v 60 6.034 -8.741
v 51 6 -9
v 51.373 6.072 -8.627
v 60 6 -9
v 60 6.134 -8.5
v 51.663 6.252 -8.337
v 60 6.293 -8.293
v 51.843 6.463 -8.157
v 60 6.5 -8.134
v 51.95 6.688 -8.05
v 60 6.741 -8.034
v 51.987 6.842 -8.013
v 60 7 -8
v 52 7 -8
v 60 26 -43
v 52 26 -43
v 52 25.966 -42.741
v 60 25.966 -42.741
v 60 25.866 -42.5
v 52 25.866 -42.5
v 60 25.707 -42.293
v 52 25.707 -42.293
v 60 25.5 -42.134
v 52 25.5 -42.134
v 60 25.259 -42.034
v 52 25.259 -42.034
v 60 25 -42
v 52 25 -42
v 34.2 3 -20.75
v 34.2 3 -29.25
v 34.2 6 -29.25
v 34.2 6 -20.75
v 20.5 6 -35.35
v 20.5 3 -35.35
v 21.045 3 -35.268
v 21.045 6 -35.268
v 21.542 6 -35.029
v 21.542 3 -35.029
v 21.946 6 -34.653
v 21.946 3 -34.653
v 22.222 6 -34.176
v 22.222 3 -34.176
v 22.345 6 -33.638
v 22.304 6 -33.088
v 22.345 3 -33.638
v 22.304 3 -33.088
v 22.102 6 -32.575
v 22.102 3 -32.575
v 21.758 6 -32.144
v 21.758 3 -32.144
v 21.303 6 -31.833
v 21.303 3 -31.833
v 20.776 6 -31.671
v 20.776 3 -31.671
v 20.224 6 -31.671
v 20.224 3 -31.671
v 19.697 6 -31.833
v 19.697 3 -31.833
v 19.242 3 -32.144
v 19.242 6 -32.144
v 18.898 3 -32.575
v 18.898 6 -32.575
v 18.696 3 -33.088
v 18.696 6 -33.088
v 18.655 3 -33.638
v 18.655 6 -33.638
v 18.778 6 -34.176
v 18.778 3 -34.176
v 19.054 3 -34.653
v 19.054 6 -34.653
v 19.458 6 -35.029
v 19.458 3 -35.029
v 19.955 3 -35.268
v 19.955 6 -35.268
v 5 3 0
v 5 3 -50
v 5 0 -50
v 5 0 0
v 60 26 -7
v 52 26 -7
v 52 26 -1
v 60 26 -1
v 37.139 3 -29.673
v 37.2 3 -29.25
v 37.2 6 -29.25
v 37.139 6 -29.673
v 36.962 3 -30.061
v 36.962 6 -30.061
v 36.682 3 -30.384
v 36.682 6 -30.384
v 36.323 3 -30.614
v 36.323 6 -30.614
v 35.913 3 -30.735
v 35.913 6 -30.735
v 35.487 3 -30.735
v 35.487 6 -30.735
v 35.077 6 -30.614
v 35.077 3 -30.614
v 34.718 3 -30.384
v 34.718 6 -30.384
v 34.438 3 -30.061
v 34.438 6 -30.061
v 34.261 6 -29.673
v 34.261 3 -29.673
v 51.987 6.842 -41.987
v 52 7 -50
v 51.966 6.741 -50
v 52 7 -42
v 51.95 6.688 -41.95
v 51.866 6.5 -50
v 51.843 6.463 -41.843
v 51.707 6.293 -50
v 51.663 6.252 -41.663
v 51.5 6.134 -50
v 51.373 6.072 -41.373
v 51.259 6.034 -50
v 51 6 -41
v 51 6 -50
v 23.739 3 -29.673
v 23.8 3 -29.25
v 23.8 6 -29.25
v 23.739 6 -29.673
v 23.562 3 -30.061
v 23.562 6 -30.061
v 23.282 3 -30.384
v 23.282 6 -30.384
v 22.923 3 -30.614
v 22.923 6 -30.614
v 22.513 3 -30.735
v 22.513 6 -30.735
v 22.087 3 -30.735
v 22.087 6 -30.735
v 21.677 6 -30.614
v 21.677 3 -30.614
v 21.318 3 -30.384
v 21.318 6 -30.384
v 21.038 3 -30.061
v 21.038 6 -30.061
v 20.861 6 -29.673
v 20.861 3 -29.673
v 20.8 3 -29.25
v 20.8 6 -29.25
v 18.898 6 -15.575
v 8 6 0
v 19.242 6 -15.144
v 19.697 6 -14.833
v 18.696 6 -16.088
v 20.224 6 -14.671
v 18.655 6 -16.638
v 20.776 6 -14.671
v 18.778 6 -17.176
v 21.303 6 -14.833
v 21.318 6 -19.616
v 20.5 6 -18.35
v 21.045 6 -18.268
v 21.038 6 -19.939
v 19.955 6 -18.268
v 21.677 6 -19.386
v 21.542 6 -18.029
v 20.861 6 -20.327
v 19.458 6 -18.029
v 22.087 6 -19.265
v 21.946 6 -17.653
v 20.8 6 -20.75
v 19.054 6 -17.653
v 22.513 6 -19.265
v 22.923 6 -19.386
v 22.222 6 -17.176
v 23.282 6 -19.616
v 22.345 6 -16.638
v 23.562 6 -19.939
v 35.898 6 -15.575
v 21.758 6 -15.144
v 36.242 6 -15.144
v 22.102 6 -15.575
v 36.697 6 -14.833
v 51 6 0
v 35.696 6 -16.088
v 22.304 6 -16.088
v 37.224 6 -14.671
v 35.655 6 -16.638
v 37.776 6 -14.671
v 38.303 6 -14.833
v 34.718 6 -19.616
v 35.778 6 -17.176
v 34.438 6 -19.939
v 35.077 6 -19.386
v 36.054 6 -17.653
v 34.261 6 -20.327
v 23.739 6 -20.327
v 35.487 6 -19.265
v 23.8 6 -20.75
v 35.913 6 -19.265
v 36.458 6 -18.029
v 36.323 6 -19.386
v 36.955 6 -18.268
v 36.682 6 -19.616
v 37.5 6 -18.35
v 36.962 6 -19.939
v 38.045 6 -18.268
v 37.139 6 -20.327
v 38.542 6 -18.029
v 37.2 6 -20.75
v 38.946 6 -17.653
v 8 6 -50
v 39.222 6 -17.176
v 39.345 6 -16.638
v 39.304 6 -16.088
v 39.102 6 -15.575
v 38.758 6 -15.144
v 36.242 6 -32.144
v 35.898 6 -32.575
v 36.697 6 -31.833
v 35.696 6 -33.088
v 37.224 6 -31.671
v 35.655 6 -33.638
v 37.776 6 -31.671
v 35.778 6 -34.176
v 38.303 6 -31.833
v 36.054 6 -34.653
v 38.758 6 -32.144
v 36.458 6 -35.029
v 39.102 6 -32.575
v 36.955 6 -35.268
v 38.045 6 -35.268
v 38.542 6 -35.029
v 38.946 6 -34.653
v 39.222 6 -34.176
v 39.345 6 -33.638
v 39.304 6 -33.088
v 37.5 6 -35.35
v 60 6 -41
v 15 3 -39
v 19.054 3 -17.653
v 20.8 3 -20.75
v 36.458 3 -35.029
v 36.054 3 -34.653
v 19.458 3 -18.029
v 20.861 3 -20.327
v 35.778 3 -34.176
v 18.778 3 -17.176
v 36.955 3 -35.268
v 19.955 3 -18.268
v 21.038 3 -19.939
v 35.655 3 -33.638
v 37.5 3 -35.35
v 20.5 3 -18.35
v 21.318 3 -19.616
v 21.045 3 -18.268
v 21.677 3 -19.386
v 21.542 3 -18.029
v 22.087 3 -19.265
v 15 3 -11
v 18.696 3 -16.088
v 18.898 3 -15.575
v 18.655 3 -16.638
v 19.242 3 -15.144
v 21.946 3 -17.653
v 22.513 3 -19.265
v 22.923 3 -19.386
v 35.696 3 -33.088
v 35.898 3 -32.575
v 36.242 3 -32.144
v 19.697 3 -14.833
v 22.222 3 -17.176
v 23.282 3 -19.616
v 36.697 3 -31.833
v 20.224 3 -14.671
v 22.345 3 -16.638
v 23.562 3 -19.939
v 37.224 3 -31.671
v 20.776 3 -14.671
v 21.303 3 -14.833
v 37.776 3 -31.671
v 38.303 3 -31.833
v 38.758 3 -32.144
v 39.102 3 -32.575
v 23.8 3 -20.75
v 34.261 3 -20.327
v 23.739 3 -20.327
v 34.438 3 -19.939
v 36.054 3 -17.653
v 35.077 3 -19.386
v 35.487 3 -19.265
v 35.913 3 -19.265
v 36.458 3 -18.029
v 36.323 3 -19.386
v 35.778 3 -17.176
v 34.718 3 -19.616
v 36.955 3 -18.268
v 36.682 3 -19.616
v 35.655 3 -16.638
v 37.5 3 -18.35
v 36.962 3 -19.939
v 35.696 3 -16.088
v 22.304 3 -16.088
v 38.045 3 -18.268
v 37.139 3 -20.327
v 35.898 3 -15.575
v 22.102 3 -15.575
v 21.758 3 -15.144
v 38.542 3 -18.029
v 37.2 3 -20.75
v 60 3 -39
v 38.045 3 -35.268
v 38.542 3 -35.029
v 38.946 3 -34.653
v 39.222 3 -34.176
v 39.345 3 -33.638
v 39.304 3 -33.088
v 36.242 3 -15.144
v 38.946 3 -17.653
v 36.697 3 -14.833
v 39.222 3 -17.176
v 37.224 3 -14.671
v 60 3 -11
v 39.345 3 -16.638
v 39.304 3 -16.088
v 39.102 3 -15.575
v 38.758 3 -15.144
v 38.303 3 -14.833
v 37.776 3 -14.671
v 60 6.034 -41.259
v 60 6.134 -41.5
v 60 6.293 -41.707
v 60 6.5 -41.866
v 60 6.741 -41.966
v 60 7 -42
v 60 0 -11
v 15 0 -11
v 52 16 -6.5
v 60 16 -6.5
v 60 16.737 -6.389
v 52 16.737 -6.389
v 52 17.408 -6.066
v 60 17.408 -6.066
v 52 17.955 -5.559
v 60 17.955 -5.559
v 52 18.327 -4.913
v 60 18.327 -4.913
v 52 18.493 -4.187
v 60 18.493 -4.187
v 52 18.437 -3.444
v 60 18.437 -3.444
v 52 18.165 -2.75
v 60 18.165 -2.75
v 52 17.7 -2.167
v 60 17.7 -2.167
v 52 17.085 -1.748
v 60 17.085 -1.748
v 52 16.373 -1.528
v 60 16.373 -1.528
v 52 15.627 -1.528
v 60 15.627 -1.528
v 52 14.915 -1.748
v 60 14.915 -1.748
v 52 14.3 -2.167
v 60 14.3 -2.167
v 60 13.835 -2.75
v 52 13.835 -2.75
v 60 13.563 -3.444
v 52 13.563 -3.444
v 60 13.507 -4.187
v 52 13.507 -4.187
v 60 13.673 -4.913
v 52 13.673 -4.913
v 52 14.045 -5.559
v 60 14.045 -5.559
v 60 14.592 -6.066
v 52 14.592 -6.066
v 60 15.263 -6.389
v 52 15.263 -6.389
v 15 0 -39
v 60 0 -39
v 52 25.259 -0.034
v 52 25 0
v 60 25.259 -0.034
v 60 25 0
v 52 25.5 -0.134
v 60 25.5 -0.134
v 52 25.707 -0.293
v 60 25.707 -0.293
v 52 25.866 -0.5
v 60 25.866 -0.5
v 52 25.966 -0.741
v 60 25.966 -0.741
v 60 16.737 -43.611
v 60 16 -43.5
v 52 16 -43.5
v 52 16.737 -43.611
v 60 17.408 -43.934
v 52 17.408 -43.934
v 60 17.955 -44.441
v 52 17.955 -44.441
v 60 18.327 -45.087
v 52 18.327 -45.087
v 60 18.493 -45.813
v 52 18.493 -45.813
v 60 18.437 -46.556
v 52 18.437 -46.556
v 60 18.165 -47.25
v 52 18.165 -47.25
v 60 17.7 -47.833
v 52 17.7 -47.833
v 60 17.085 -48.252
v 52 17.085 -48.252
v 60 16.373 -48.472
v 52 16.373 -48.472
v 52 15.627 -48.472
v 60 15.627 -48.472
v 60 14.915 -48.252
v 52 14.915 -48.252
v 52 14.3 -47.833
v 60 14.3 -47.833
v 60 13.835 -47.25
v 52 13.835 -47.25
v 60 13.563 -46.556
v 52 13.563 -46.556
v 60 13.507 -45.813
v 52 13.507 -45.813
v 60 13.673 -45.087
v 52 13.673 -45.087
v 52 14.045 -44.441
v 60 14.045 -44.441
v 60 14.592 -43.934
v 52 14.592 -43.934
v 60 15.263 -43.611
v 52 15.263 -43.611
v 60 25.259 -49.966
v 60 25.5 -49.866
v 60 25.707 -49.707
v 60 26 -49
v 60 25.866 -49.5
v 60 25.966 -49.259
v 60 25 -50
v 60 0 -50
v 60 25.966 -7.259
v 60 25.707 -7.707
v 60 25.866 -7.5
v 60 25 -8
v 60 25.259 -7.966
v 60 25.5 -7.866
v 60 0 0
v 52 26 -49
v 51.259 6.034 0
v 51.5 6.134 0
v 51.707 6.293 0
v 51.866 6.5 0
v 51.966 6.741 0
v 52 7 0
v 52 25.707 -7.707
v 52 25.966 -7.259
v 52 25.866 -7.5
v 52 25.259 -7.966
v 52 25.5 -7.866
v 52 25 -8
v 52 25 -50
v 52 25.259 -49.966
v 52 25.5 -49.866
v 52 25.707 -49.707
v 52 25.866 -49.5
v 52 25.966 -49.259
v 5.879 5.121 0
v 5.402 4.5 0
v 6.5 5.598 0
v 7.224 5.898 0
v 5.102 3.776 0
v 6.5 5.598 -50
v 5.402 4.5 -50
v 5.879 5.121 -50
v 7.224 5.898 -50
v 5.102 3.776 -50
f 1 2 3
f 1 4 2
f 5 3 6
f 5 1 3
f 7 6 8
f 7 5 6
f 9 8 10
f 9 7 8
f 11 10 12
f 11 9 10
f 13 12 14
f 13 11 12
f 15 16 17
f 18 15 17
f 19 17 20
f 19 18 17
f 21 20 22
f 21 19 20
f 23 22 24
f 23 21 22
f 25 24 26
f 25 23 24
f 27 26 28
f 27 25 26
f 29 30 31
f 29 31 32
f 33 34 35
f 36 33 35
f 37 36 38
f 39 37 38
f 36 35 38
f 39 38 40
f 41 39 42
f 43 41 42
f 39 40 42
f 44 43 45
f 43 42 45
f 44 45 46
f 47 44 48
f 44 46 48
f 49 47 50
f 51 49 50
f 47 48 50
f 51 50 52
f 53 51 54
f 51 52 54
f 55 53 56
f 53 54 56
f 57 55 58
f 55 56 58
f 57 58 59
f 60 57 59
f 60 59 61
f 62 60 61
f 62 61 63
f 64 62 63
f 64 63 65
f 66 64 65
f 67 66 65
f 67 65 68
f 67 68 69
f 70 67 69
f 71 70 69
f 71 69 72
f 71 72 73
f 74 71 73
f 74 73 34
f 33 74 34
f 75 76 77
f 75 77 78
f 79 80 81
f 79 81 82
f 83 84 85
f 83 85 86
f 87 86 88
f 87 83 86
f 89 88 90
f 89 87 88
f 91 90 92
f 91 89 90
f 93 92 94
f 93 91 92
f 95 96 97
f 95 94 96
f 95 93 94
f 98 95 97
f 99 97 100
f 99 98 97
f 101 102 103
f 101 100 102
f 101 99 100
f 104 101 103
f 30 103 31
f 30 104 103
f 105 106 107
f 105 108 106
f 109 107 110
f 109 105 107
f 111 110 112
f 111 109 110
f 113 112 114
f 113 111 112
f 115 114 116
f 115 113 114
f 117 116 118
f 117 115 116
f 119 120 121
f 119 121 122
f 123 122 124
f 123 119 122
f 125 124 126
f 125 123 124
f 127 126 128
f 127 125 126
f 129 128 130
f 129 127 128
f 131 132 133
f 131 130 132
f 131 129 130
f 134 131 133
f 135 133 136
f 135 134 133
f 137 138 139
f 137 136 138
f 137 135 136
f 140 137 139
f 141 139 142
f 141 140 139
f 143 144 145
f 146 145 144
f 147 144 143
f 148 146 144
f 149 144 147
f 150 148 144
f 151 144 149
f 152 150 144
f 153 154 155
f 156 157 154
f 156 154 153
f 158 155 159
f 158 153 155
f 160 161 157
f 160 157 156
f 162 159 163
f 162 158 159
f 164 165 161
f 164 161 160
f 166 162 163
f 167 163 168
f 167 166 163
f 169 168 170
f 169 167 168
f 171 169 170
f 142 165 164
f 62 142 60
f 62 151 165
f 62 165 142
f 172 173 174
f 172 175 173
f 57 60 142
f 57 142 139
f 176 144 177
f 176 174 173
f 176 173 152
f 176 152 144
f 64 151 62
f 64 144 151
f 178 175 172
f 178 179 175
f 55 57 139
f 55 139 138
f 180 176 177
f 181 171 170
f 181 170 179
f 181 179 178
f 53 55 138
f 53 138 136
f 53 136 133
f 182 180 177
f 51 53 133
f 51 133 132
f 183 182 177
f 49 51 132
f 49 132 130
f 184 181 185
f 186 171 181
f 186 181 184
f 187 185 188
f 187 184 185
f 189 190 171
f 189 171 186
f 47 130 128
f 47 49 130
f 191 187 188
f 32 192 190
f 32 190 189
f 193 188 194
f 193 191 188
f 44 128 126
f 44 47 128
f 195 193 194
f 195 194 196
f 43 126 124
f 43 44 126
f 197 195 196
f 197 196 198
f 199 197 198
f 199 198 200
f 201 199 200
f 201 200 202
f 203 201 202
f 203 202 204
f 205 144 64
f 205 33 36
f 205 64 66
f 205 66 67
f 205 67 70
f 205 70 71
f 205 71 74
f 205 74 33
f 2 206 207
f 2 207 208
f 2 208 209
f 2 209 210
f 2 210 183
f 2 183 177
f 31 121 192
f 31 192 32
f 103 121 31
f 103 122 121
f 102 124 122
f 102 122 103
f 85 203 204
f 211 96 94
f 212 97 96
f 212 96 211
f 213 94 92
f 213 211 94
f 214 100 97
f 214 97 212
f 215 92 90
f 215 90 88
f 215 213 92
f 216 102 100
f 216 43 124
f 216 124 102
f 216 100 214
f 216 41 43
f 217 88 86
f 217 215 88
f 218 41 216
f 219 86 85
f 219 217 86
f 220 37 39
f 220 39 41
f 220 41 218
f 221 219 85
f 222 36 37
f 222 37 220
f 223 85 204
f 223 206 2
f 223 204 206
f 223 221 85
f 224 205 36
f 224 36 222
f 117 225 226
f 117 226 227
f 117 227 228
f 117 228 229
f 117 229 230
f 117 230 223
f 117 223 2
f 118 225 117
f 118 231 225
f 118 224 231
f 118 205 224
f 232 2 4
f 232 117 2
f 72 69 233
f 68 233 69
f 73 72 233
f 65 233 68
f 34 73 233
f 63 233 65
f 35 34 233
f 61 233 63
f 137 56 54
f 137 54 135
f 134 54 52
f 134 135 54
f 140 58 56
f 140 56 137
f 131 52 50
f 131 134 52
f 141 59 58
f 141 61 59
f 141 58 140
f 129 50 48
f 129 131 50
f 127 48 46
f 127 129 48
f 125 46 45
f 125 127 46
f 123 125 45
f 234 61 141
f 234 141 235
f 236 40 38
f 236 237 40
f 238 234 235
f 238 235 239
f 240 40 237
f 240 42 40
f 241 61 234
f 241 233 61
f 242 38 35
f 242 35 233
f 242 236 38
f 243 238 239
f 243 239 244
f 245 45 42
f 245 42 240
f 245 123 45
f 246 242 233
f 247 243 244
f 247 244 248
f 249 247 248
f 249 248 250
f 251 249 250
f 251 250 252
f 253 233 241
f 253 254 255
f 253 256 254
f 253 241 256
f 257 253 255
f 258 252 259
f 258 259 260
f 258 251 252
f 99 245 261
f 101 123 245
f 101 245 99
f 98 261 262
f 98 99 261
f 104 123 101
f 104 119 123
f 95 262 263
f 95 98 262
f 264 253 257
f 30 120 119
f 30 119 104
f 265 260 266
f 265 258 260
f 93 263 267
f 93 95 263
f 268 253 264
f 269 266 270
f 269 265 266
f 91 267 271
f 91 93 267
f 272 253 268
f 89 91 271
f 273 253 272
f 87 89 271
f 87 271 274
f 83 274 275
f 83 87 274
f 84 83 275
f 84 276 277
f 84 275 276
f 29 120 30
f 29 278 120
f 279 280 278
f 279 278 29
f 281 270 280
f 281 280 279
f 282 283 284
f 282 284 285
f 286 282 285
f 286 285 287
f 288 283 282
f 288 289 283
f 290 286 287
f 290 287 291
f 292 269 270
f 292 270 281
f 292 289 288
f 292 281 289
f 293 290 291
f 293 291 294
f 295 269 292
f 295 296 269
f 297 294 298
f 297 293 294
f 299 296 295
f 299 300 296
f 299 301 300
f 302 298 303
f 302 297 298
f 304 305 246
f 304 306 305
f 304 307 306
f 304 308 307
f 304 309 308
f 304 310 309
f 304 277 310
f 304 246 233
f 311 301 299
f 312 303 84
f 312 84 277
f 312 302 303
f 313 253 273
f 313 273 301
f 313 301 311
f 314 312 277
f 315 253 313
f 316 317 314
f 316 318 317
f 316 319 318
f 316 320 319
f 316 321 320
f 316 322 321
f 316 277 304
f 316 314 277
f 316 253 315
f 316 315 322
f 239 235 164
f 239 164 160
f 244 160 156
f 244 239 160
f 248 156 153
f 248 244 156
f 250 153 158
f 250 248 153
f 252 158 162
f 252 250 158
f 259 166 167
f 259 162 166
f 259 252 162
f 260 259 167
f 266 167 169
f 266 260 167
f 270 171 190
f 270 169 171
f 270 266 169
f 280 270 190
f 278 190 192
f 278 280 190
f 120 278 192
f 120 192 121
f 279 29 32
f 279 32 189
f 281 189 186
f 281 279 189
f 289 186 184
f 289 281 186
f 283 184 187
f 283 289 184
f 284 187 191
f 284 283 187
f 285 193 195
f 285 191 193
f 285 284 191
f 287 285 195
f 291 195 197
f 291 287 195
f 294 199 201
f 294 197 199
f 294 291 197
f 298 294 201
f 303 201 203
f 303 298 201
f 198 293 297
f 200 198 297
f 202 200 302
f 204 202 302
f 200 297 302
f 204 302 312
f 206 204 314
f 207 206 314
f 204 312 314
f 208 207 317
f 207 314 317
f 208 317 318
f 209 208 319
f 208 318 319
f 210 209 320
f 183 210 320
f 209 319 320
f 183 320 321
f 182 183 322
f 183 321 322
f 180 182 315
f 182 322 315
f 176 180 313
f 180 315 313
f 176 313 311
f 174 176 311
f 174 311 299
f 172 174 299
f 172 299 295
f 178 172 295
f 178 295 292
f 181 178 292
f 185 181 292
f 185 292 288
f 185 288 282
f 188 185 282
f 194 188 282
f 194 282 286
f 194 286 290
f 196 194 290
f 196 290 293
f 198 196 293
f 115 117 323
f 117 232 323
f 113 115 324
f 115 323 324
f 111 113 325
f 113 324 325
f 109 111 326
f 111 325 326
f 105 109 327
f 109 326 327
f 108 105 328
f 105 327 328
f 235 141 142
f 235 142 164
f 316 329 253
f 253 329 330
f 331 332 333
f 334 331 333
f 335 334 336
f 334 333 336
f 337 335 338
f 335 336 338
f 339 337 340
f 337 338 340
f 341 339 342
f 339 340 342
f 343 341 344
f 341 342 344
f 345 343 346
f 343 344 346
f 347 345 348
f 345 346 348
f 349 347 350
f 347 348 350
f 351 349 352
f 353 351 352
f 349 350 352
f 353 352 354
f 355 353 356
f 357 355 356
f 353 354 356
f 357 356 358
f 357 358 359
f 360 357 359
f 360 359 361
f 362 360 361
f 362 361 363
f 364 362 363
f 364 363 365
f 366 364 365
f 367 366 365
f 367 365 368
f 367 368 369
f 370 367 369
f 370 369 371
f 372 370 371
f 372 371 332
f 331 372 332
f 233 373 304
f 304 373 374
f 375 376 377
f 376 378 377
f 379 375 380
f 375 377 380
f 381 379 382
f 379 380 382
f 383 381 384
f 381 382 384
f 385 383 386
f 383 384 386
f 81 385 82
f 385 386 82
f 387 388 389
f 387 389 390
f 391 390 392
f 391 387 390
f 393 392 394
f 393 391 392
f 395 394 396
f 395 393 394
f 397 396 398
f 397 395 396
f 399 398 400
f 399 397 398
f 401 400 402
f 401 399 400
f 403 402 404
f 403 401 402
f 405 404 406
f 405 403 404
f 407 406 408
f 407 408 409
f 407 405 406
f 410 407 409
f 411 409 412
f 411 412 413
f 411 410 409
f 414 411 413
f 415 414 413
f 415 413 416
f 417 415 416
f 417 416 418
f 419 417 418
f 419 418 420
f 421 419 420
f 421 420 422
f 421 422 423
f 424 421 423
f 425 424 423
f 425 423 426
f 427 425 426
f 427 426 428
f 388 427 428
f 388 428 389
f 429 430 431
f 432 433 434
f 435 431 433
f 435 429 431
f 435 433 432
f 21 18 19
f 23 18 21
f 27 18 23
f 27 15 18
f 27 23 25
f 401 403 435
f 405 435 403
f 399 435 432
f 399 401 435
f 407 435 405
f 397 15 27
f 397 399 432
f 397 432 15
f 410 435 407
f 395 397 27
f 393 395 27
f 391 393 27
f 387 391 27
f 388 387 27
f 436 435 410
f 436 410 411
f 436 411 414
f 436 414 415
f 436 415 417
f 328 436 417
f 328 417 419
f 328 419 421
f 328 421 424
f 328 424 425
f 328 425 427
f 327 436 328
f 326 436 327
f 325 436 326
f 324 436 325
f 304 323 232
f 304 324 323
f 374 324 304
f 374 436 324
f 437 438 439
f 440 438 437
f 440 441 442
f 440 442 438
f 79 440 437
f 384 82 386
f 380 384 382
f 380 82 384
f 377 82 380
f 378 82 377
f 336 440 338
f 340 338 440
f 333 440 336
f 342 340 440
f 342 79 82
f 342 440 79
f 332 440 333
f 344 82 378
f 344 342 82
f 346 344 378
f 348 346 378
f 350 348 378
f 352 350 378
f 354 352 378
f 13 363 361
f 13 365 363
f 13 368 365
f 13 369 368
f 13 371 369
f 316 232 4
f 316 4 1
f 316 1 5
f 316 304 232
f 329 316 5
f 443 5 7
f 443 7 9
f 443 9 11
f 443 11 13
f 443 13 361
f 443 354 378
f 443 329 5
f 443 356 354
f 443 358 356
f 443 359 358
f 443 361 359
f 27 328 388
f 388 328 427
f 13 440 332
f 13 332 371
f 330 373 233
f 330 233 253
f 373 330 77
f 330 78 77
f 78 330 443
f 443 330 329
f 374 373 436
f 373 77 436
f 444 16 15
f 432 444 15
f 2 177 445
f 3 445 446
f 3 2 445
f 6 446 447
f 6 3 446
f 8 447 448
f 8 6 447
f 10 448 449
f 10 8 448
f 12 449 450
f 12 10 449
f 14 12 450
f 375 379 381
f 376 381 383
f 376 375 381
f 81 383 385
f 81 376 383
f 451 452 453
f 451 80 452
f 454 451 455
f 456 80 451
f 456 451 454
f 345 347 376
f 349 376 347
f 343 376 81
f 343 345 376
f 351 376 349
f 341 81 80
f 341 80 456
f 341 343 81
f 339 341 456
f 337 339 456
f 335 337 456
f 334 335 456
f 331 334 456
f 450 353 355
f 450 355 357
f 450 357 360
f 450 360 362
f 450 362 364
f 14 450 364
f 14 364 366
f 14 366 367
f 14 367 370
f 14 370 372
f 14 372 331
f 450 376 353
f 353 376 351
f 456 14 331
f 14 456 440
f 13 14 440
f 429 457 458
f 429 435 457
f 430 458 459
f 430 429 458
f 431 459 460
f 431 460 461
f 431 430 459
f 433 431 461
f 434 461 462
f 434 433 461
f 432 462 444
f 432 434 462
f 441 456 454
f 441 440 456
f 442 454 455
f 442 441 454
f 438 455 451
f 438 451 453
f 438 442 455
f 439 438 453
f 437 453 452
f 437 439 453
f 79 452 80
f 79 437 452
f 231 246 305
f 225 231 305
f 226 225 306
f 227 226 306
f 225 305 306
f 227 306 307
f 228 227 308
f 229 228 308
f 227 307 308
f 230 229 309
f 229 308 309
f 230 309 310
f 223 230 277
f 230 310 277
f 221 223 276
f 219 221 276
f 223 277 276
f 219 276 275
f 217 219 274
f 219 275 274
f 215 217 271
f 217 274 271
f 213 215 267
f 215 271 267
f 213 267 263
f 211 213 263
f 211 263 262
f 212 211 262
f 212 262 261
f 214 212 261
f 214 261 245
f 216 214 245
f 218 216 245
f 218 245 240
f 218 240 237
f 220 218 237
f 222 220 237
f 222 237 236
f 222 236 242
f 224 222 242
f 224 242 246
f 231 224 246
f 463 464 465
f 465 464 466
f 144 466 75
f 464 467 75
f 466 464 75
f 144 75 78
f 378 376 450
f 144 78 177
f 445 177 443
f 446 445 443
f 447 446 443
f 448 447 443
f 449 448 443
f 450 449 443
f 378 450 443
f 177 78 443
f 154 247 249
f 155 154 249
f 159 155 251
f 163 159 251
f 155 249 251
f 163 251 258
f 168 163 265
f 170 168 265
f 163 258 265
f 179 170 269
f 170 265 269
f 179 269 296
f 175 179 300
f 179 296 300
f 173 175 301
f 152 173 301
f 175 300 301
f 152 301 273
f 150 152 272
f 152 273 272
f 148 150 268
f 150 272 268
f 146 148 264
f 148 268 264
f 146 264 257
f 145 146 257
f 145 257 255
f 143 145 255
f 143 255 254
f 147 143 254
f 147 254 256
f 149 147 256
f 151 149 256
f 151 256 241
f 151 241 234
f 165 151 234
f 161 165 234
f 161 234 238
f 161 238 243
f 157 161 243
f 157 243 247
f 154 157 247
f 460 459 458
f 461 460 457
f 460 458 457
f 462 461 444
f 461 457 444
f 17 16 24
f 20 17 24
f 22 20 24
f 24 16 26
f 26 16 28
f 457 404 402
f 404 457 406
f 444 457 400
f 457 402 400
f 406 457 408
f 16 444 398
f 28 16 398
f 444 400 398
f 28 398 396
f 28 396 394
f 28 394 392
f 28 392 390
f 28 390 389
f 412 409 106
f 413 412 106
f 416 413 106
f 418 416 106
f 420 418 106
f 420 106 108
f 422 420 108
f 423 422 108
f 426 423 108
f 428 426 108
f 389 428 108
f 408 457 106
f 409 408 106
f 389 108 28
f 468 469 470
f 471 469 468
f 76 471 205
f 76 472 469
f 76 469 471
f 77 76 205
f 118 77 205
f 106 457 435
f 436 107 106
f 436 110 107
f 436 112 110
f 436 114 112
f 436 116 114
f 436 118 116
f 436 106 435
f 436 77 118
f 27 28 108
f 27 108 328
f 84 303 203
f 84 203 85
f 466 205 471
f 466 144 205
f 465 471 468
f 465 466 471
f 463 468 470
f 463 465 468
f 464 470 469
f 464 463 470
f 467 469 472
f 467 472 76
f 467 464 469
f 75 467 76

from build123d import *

# Parameters (mm, degrees)
SKETCH1_W           = 60
SKETCH1_H           = 50
BOSS_EXTRUDE1_DEPTH = 6
SKETCH2_W           = 8
SKETCH2_H           = 8
BOSS_EXTRUDE2_DEPTH = 20
CUT_EXTRUDE1_REACH  = 84.316
SKETCH3_R           = 2.5
SKETCH4_W           = 28
SKETCH4_H           = 28
SKETCH4_W_2         = 17
CUT_EXTRUDE2_DEPTH  = 3
CUT_EXTRUDE3_REACH  = 83.419
SKETCH5_R           = 1.85
SKETCH6_W           = 50
SKETCH6_H           = 6
CUT_EXTRUDE4_DEPTH  = 5
FILLET1_R           = 1
FILLET2_R           = 1
FILLET4_R           = 3


with BuildPart() as part:
    # Sketch1 → Boss-Extrude1 (new body)
    with BuildSketch(Plane(origin=(0, 0, 0), x_dir=(1, 0, 0), z_dir=(0, 1, 0))):
        with Locations((30, 25)):
            Rectangle(SKETCH1_W, SKETCH1_H)
    extrude(amount=BOSS_EXTRUDE1_DEPTH)

    # Sketch2 → Boss-Extrude2 (add)
    with BuildSketch(Plane(origin=(0, 6, 0), x_dir=(1, 0, 0), z_dir=(0, 1, 0))):
        with Locations((56, 4)):
            Rectangle(SKETCH2_W, SKETCH2_H)
    boss_extrude2 = extrude(amount=BOSS_EXTRUDE2_DEPTH)

    # Sketch3 → Cut-Extrude1 (cut, up to next)
    with BuildSketch(Plane(origin=(60, 0, 0), x_dir=(0, 0, -1), z_dir=(1, 0, 0)), mode=Mode.PRIVATE) as cut_extrude1_sk1:
        with Locations((4, 16)):
            Circle(SKETCH3_R)
    cut_extrude1_tool1 = extrude(cut_extrude1_sk1.sketch, amount=-CUT_EXTRUDE1_REACH, mode=Mode.PRIVATE) & part.part
    cut_extrude1 = cut_extrude1_tool1.solids().sort_by_distance((60, 16, -4))[0]
    add(cut_extrude1, mode=Mode.SUBTRACT)

    # Mirror1: Boss-Extrude2, Cut-Extrude1 across plane
    add(boss_extrude2.mirror(Plane.XY.offset(-25)))
    add(cut_extrude1.mirror(Plane.XY.offset(-25)), mode=Mode.SUBTRACT)

    # Sketch4 → Cut-Extrude2 (cut)
    with BuildSketch(Plane.XZ):
        with Locations((29, -25)):
            Rectangle(SKETCH4_W, SKETCH4_H)
        with Locations((51.5, -25)):
            Rectangle(SKETCH4_W_2, SKETCH4_H)
    extrude(amount=-CUT_EXTRUDE2_DEPTH, mode=Mode.SUBTRACT)

    # Sketch5 → Cut-Extrude3 (cut, up to next)
    with BuildSketch(Plane.XZ.offset(-3), mode=Mode.PRIVATE) as cut_extrude3_sk1:
        with Locations(Location((20.5, -16.5, 0), (0, 0, 270))):
            Circle(SKETCH5_R)
    cut_extrude3_tool1 = extrude(cut_extrude3_sk1.sketch, amount=-CUT_EXTRUDE3_REACH, mode=Mode.PRIVATE) & part.part
    # Sketch5 → Cut-Extrude3 (cut, up to next)
    with BuildSketch(Plane.XZ.offset(-3), mode=Mode.PRIVATE) as cut_extrude3_sk2:
        with Locations(Location((37.5, -16.5, 0), (0, 0, 270))):
            Circle(SKETCH5_R)
    cut_extrude3_tool2 = extrude(cut_extrude3_sk2.sketch, amount=-CUT_EXTRUDE3_REACH, mode=Mode.PRIVATE) & part.part
    # Sketch5 → Cut-Extrude3 (cut, up to next)
    with BuildSketch(Plane.XZ.offset(-3), mode=Mode.PRIVATE) as cut_extrude3_sk3:
        with Locations(Location((37.5, -33.5, 0), (0, 0, 270))):
            Circle(SKETCH5_R)
    cut_extrude3_tool3 = extrude(cut_extrude3_sk3.sketch, amount=-CUT_EXTRUDE3_REACH, mode=Mode.PRIVATE) & part.part
    # Sketch5 → Cut-Extrude3 (cut, up to next)
    with BuildSketch(Plane.XZ.offset(-3), mode=Mode.PRIVATE) as cut_extrude3_sk4:
        with Locations(Location((20.5, -33.5, 0), (0, 0, 270))):
            Circle(SKETCH5_R)
    cut_extrude3_tool4 = extrude(cut_extrude3_sk4.sketch, amount=-CUT_EXTRUDE3_REACH, mode=Mode.PRIVATE) & part.part
    # Sketch5 → Cut-Extrude3 (cut, up to next)
    with BuildSketch(Plane.XZ.offset(-3), mode=Mode.PRIVATE) as cut_extrude3_sk5:
        with BuildLine():
            Line((37.2, -20.75), (37.2, -29.25))
            ThreePointArc((37.2, -29.25), (35.7, -30.75), (34.2, -29.25))
            Line((34.2, -29.25), (34.2, -20.75))
            ThreePointArc((34.2, -20.75), (35.7, -19.25), (37.2, -20.75))
        make_face()
    cut_extrude3_tool5 = extrude(cut_extrude3_sk5.sketch, amount=-CUT_EXTRUDE3_REACH, mode=Mode.PRIVATE) & part.part
    # Sketch5 → Cut-Extrude3 (cut, up to next)
    with BuildSketch(Plane.XZ.offset(-3), mode=Mode.PRIVATE) as cut_extrude3_sk6:
        with BuildLine():
            Line((23.8, -20.75), (23.8, -29.25))
            ThreePointArc((23.8, -29.25), (22.3, -30.75), (20.8, -29.25))
            Line((20.8, -29.25), (20.8, -20.75))
            ThreePointArc((20.8, -20.75), (22.3, -19.25), (23.8, -20.75))
        make_face()
    cut_extrude3_tool6 = extrude(cut_extrude3_sk6.sketch, amount=-CUT_EXTRUDE3_REACH, mode=Mode.PRIVATE) & part.part
    add(cut_extrude3_tool1.solids().sort_by_distance((20.5, 3, -16.5))[0], mode=Mode.SUBTRACT)
    add(cut_extrude3_tool2.solids().sort_by_distance((37.5, 3, -16.5))[0], mode=Mode.SUBTRACT)
    add(cut_extrude3_tool3.solids().sort_by_distance((37.5, 3, -33.5))[0], mode=Mode.SUBTRACT)
    add(cut_extrude3_tool4.solids().sort_by_distance((20.5, 3, -33.5))[0], mode=Mode.SUBTRACT)
    add(cut_extrude3_tool5.solids().sort_by_distance((35.7, 3, -25))[0], mode=Mode.SUBTRACT)
    add(cut_extrude3_tool6.solids().sort_by_distance((22.3, 3, -25))[0], mode=Mode.SUBTRACT)

    # Sketch6 → Cut-Extrude4 (cut)
    with BuildSketch(Plane.ZY):
        with Locations((-25, 3)):
            Rectangle(SKETCH6_W, SKETCH6_H)
    extrude(amount=-CUT_EXTRUDE4_DEPTH, mode=Mode.SUBTRACT)

    # Fillet1
    fillet1_edges = [part.edges().sort_by_distance(p)[0] for p in [
        (56, 26, -8),
        (56, 26, 0),
        (56, 26, -50),
        (56, 26, -42),
    ]]
    fillet(fillet1_edges, radius=FILLET1_R)

    # Fillet2
    fillet2_edges = [part.edges().sort_by_distance(p)[0] for p in [
        (56, 6, -8),
        (52, 6, -4),
        (56, 6, -42),
        (52, 6, -46),
    ]]
    fillet(fillet2_edges, radius=FILLET2_R)

    # Fillet4
    fillet4_edges = [part.edges().sort_by_distance(p)[0] for p in [
        (5, 6, -25),
    ]]
    fillet(fillet4_edges, radius=FILLET4_R)


solid = part.part
